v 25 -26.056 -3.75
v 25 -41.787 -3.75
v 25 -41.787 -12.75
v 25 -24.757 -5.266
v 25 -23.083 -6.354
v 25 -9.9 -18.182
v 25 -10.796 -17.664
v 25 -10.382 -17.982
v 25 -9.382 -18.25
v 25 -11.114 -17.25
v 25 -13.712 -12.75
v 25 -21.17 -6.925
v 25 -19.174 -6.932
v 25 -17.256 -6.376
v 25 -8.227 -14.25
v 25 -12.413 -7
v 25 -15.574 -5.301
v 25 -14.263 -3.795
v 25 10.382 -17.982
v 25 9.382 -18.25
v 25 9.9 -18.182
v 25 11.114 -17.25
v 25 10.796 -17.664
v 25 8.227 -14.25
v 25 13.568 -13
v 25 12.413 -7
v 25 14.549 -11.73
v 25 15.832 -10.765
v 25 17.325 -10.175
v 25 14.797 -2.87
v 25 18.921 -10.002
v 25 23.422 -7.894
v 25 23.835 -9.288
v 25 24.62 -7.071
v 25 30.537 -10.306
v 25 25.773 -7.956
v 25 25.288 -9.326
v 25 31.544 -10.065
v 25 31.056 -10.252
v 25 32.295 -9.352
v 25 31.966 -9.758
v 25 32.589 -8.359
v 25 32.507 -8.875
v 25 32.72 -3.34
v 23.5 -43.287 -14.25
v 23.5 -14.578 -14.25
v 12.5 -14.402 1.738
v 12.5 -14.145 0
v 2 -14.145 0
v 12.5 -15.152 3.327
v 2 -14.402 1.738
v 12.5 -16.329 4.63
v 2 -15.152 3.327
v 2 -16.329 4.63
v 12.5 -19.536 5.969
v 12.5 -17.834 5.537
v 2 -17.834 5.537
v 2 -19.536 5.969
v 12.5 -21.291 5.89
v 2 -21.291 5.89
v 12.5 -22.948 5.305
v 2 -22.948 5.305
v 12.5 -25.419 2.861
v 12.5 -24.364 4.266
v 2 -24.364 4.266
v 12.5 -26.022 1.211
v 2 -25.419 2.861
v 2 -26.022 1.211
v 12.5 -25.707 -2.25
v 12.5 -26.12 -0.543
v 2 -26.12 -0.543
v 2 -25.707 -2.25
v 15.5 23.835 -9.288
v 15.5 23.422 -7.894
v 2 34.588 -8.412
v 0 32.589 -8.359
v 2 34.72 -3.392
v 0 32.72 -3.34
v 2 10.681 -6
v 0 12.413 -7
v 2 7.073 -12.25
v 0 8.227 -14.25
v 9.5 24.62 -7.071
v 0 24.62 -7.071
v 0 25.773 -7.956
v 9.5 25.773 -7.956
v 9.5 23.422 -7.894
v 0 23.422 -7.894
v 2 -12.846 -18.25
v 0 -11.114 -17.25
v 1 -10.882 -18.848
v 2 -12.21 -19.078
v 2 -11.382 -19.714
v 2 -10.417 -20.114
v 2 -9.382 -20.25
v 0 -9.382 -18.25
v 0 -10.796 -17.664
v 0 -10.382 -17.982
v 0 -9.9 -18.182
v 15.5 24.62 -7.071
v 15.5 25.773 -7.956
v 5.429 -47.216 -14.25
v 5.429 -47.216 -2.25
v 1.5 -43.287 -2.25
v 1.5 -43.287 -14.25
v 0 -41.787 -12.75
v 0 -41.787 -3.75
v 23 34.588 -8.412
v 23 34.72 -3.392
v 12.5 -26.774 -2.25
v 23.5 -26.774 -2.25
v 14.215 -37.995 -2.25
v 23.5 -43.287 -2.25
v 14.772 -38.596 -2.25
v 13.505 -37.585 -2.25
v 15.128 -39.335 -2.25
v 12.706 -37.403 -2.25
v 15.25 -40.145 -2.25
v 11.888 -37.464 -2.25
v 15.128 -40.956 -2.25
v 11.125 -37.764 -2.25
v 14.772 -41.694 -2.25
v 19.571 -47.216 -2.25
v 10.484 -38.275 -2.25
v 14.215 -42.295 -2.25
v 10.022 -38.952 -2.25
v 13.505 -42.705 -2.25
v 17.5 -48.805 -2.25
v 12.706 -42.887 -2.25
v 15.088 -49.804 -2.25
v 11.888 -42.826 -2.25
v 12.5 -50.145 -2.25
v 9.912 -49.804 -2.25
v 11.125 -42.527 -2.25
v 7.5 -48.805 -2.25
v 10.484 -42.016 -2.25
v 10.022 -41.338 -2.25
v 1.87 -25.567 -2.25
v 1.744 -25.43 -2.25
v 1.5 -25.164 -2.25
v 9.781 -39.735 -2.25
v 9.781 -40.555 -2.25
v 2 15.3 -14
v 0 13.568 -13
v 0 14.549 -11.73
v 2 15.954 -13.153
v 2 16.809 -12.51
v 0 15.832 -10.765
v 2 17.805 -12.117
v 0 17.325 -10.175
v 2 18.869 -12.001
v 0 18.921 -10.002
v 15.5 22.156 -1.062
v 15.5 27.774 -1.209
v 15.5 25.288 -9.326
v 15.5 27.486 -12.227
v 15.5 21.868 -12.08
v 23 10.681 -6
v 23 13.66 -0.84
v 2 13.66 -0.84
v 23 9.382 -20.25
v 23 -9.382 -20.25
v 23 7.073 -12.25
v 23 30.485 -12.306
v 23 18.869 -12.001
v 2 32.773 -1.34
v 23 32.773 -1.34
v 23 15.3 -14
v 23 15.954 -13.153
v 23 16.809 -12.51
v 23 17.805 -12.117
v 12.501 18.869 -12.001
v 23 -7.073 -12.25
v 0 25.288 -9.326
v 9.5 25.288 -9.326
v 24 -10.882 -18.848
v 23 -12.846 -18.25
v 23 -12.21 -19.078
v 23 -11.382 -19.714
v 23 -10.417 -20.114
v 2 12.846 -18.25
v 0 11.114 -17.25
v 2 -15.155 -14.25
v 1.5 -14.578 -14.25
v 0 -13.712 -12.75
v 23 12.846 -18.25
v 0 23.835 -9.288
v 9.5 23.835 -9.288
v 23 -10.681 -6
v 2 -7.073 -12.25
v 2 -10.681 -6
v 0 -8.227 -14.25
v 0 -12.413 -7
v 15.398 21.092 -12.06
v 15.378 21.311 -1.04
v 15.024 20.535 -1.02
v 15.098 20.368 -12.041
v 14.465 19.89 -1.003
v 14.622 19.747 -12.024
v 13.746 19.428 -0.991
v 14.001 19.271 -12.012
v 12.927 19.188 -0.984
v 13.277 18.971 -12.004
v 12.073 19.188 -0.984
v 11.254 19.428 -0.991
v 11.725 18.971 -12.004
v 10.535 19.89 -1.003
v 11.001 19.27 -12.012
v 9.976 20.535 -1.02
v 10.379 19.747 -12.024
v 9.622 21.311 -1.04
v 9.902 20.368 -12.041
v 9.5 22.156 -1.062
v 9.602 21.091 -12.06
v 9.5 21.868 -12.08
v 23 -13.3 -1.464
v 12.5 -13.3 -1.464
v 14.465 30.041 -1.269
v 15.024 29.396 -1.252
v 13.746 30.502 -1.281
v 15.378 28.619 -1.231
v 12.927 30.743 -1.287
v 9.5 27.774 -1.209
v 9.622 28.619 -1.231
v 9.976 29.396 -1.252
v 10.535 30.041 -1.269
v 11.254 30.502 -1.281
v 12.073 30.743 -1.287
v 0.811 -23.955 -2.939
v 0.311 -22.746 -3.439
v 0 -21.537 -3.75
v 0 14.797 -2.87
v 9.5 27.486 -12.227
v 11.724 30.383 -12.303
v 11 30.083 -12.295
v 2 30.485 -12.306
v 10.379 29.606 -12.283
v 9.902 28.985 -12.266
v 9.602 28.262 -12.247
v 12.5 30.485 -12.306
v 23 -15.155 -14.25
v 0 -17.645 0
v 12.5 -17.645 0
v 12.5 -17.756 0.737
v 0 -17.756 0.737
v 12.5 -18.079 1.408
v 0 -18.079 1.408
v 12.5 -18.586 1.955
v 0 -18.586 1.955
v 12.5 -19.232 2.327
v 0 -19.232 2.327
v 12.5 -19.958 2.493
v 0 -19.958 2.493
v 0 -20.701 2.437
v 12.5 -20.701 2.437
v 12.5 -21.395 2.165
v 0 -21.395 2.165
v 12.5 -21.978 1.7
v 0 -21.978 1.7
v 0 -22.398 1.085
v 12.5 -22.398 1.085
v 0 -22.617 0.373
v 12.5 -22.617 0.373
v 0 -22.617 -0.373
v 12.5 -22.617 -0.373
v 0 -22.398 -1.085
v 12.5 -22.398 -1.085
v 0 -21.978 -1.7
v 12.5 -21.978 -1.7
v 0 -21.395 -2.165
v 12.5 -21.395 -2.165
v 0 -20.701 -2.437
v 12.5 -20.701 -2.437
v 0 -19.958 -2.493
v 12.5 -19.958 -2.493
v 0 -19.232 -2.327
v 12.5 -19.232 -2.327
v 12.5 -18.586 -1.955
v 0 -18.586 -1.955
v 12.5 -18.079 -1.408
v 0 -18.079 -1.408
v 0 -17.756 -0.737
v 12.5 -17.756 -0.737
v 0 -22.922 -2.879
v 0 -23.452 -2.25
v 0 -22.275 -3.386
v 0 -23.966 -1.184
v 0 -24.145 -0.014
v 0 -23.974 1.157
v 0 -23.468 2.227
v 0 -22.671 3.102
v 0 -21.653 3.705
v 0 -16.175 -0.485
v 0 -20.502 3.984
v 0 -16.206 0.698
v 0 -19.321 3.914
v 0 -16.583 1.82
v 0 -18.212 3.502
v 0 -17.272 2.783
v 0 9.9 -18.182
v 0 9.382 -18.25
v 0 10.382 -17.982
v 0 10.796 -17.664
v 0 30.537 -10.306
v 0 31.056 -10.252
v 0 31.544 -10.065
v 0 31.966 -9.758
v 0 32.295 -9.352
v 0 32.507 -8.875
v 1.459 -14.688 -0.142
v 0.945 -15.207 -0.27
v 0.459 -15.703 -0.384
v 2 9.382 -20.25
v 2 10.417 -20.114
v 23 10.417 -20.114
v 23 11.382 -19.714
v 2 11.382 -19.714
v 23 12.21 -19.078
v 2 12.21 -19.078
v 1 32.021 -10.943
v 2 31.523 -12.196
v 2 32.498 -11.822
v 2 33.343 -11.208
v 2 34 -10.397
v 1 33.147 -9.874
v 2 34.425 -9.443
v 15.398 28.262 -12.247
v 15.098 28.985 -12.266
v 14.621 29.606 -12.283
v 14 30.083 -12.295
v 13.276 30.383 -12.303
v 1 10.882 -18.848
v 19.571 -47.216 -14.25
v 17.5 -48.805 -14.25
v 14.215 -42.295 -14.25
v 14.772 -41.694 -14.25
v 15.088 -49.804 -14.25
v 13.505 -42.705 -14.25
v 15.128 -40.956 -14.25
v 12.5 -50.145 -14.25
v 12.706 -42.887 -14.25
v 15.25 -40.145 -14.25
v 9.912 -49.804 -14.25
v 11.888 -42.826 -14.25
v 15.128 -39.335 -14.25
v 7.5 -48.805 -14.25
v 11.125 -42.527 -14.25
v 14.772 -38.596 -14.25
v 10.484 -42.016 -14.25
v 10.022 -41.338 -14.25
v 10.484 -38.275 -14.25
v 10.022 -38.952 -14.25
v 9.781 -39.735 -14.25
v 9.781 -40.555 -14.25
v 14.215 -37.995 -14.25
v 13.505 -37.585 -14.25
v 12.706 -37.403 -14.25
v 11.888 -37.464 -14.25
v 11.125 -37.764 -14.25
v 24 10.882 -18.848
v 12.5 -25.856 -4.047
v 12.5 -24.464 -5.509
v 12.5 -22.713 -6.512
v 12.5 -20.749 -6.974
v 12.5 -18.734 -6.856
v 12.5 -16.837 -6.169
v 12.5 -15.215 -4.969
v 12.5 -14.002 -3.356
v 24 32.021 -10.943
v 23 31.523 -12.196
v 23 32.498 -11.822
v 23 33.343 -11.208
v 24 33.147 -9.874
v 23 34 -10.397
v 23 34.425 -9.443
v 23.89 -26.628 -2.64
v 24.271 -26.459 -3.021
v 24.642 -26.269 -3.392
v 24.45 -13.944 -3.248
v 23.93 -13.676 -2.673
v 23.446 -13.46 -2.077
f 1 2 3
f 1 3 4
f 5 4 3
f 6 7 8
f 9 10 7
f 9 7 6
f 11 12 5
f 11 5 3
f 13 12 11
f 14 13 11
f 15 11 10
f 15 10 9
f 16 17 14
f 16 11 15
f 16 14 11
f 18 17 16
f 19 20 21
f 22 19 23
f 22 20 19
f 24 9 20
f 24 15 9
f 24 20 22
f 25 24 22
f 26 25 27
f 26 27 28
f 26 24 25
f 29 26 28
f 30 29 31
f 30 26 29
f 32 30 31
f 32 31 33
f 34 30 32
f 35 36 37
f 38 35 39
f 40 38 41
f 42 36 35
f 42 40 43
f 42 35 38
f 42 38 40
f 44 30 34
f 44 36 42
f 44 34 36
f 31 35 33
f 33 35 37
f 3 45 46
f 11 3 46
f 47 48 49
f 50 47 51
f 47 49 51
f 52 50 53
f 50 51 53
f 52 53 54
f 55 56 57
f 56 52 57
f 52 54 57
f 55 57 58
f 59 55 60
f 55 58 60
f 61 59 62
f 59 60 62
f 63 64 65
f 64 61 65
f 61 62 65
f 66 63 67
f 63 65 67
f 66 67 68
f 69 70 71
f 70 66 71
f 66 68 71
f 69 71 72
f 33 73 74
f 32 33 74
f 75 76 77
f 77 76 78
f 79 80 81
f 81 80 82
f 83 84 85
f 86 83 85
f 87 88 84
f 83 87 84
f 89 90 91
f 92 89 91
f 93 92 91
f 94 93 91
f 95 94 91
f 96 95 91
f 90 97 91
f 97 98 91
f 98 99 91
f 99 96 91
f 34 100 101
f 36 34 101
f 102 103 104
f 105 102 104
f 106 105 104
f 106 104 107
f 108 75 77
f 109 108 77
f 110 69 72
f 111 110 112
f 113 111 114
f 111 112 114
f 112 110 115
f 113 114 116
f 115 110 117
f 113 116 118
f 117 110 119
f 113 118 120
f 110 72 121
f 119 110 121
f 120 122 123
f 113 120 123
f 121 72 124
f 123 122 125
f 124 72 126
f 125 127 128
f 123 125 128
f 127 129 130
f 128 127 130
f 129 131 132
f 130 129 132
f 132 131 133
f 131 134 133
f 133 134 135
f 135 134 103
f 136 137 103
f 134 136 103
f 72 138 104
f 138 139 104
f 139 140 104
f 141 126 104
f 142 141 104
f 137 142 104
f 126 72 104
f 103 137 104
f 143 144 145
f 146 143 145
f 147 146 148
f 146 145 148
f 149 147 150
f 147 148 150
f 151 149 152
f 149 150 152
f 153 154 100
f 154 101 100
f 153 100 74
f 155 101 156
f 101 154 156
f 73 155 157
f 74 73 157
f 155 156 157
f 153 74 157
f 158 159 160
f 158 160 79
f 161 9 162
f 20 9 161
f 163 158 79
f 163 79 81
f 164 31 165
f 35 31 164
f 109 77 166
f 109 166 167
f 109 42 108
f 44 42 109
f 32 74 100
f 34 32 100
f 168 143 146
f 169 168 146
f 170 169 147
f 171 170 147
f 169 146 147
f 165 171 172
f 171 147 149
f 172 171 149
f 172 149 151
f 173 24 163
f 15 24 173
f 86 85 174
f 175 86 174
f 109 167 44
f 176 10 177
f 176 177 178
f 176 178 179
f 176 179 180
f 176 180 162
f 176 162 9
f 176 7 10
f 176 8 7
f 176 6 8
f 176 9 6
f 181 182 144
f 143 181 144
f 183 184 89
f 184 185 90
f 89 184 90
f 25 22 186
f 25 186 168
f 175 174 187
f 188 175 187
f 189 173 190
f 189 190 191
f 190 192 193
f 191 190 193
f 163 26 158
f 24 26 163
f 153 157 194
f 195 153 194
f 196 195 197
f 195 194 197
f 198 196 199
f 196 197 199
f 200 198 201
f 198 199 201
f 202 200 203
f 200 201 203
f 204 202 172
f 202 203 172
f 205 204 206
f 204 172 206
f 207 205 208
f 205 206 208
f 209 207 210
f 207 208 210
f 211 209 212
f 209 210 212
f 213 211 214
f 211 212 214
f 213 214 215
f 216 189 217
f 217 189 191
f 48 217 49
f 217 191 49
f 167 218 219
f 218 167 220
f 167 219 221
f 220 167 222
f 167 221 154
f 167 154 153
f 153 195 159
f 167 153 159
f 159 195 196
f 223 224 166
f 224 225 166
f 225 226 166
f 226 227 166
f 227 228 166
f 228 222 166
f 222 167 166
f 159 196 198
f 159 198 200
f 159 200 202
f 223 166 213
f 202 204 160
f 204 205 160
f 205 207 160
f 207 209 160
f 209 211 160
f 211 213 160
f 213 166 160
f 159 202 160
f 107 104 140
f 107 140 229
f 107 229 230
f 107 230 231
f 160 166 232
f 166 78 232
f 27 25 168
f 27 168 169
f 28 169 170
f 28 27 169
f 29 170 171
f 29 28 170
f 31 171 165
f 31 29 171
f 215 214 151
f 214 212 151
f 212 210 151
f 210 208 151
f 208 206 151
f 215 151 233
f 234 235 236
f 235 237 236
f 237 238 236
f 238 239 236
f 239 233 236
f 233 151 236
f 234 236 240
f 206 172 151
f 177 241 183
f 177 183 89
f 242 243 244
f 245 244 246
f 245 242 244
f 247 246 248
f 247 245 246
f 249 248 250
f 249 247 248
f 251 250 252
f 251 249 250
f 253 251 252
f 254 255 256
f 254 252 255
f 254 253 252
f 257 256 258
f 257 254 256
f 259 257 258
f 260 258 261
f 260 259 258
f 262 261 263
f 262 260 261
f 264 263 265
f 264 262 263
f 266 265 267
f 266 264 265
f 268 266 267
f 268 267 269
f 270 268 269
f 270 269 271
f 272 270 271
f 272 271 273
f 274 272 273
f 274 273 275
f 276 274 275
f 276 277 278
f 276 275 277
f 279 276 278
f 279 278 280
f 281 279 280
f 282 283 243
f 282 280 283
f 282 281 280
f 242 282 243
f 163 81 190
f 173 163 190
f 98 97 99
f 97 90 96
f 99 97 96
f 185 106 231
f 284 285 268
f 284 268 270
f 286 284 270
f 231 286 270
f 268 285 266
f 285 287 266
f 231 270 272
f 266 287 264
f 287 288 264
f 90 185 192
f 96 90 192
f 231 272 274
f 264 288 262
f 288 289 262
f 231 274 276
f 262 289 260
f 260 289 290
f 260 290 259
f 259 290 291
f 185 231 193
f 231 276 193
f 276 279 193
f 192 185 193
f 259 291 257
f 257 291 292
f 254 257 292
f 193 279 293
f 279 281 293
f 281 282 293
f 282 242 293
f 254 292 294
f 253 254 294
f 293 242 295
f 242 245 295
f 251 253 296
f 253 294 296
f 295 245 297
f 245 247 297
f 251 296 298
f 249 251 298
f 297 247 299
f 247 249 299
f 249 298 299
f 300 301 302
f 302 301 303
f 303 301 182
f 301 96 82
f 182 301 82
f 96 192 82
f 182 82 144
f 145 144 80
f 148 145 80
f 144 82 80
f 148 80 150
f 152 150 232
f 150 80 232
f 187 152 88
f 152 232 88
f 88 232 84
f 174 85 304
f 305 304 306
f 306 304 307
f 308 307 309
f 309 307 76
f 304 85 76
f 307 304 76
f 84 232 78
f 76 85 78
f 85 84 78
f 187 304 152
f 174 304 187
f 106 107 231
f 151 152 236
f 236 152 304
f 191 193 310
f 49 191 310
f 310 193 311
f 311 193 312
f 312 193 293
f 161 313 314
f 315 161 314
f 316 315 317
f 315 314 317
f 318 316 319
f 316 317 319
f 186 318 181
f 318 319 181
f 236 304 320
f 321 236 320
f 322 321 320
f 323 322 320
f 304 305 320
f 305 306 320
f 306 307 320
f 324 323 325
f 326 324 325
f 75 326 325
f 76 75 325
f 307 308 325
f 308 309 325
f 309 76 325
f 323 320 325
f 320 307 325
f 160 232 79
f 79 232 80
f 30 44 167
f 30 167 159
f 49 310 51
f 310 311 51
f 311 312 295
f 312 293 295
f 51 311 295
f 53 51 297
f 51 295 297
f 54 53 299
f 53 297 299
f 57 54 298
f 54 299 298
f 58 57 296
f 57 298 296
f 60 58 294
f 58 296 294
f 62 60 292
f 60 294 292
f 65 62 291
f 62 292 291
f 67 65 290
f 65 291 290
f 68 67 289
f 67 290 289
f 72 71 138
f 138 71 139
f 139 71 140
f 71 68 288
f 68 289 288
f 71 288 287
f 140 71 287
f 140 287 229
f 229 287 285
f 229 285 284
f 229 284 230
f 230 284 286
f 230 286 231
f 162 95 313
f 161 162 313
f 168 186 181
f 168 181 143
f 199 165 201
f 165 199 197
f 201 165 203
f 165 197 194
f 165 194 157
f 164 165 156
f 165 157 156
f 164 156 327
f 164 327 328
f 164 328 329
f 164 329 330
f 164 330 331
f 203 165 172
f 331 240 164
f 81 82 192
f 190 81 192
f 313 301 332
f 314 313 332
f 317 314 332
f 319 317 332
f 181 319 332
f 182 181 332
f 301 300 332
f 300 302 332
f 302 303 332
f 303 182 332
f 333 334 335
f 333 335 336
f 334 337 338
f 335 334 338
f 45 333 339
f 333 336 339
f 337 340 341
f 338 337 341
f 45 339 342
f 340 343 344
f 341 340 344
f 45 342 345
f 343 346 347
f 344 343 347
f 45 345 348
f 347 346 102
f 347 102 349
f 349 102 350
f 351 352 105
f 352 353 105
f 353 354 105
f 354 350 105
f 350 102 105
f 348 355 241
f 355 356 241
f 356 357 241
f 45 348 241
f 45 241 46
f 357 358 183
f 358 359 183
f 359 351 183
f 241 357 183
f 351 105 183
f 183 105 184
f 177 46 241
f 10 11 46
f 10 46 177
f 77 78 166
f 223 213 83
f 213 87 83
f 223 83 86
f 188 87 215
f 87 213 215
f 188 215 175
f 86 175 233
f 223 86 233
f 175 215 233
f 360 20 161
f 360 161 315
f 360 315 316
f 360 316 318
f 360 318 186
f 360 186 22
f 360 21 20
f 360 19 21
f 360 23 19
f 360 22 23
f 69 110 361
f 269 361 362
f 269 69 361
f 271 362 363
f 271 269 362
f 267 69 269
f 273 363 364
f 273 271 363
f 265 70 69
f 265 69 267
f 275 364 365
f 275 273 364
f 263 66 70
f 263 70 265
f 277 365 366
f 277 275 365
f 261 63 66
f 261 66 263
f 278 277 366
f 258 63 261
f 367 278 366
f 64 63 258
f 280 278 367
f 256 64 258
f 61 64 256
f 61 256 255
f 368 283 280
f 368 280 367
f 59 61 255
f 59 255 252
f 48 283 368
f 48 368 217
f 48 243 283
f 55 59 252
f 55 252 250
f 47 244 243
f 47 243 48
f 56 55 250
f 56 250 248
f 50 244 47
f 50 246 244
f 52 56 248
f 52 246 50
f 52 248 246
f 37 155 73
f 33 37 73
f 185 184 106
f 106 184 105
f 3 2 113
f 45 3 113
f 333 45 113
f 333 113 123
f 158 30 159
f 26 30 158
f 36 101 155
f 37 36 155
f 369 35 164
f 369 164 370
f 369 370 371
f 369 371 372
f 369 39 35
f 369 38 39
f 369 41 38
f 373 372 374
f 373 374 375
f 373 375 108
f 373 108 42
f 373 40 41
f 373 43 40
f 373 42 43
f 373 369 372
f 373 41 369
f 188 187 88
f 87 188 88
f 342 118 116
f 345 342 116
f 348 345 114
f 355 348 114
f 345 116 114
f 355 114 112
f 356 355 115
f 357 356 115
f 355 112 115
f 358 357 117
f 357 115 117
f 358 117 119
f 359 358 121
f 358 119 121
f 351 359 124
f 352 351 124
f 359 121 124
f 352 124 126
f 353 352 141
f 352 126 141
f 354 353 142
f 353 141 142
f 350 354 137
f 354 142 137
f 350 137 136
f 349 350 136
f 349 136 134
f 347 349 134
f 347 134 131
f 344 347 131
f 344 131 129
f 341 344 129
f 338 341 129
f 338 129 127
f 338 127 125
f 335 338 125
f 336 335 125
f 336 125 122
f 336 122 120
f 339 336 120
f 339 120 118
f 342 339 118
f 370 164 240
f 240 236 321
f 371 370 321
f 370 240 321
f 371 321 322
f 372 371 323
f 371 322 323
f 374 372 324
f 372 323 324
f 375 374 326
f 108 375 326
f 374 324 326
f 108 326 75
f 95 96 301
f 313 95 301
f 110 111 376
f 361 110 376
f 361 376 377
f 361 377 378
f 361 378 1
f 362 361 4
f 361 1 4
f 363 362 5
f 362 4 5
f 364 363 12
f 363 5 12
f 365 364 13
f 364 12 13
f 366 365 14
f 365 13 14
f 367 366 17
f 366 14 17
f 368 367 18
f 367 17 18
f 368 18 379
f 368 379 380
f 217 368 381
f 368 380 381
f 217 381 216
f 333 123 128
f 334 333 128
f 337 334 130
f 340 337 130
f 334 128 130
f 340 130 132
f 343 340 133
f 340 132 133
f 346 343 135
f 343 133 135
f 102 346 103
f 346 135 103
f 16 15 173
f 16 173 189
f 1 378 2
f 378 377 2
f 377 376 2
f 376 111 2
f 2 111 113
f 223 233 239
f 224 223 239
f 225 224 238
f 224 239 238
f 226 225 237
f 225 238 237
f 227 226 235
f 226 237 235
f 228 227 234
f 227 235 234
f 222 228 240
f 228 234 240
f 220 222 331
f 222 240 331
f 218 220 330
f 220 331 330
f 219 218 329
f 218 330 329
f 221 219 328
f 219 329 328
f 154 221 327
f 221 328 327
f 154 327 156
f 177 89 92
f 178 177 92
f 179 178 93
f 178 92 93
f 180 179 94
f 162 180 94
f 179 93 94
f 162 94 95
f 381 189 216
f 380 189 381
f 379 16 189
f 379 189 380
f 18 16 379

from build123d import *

# Parameters (mm, degrees)
F0_R     = 2.5
F1_DEPTH = 25
F2_R     = 7
F3_DEPTH = 12.5
F5_DEPTH = 25
F6_R     = 2.75
F7_DEPTH = 25
F8_SIZE  = 2
F9_SIZE  = 1.5


with BuildPart() as f1:
    # F0 (on Right) → F1 (new body)
    with BuildSketch(Plane.YZ):
        with BuildLine():
            Line((34.771998, -1.392547), (13.660271, -0.839717))
            Line((13.660271, -0.839717), (10.68098, -6))
            Line((10.68098, -6), (7.072541, -12.25))
            Line((7.072541, -12.25), (-7.072541, -12.25))
            Line((-7.072541, -12.25), (-10.68098, -6))
            Line((-10.68098, -6), (-14.145082, 0))
            ThreePointArc((-14.145082, 0), (-18.998978, -5.88952), (-25.70723, -2.25))
            Line((-25.70723, -2.25), (-50.145082, -2.25))
            Line((-50.145082, -2.25), (-50.145082, -14.25))
            Line((-50.145082, -14.25), (-15.155445, -14.25))
            Line((-15.155445, -14.25), (-12.846043, -18.25))
            ThreePointArc((-12.846043, -18.25), (-11.381942, -19.714102), (-9.381942, -20.25))
            Line((-9.381942, -20.25), (9.381942, -20.25))
            ThreePointArc((9.381942, -20.25), (11.381942, -19.714102), (12.846043, -18.25))
            Line((12.846043, -18.25), (15.299782, -14))
            ThreePointArc((15.299782, -14), (16.809399, -12.510016), (18.868592, -12.001371))
            Line((18.868592, -12.001371), (30.48486, -12.305553))
            ThreePointArc((30.48486, -12.305553), (33.342986, -11.208422), (34.588197, -8.411632))
            Line((34.588197, -8.411632), (34.771998, -1.392547))
        make_face()
        Polygon((25.287627, -9.3256), (23.83504, -9.287563), (23.422342, -7.894316), (24.619867, -7.07128), (25.772677, -7.955862), align=None, mode=Mode.SUBTRACT)
        with BuildLine():
            ThreePointArc((-25.70723, -2.25), (-18.998978, -5.88952), (-14.145082, 0))
            ThreePointArc((-14.145082, 0), (-21.291185, 5.88952), (-25.70723, -2.25))
        make_face()
        with Locations((-20.145082, 0)):
            Circle(F0_R, mode=Mode.SUBTRACT)
    extrude(amount=F1_DEPTH)

    # F2 (on face) → F3 (cut)
    with BuildSketch(Plane.YZ.offset(25)):
        with Locations((-20.145082, 0)):
            Circle(F2_R)
    extrude(amount=-F3_DEPTH, mode=Mode.SUBTRACT)

    # F4 (on face) → F5 (cut)
    with BuildSketch(Plane(origin=(0, -0.301122, -11.499394), x_dir=(1, 0, 0), z_dir=(0, -0.026177, -0.999657))):
        with BuildLine():
            Line((9.5, -22.176285), (9.5, -27.796535))
            ThreePointArc((9.5, -27.796535), (12.5, -30.796535), (15.5, -27.796535))
            Line((15.5, -27.796535), (15.5, -22.176285))
            ThreePointArc((15.5, -22.176285), (12.5, -19.176285), (9.5, -22.176285))
        make_face()
    extrude(amount=-F5_DEPTH, mode=Mode.SUBTRACT)

    # F6 (on face) → F7 (cut)
    with BuildSketch(Plane.XY.offset(-2.25)):
        with Locations((12.5, -40.145082)):
            Circle(F6_R)
        with BuildLine():
            ThreePointArc((19.571068, -47.216149), (12.5, -50.145082), (5.428932, -47.216149))
            Line((5.428932, -47.216149), (-9.84301, -31.944207))
            Line((-9.84301, -31.944207), (-9.84301, -58.411797))
            Line((-9.84301, -58.411797), (34.84301, -58.411797))
            Line((34.84301, -58.411797), (34.84301, -31.944207))
            Line((34.84301, -31.944207), (19.571068, -47.216149))
        make_face()
    extrude(amount=-F7_DEPTH, mode=Mode.SUBTRACT)

    # F8
    f8_edges = [f1.edges().sort_by_distance(p)[0] for p in [
        (0, 24.216134, -1.116132),
        (0, 10.366406, -6.544858),
        (0, 0, -12.25),
        (0, -10.608811, -6.125),
        (0, -21.291185, 5.88952),
        (0, -14.000744, -16.25),
        (12.5, 34.771998, -1.392547),
        (25, 24.216134, -1.116132),
        (25, 10.366406, -6.544858),
        (25, 0, -12.25),
        (25, -10.186207, -6.856971),
        (25, -14.000744, -16.25),
        (25, -11.381942, -19.714102),
        (25, 0, -20.25),
        (25, 11.381942, -19.714102),
        (25, 14.072913, -16.125),
        (25, 24.676726, -12.153462),
        (25, 16.809399, -12.510016),
        (25, 33.342986, -11.208422),
        (25, 34.680097, -4.902089),
        (0, -11.381942, -19.714102),
        (0, 0, -20.25),
        (0, 11.381942, -19.714102),
        (0, 14.072913, -16.125),
        (0, 16.809399, -12.510016),
        (0, 24.676726, -12.153462),
        (0, 33.342986, -11.208422),
        (0, 34.680097, -4.902089),
    ]]
    chamfer(f8_edges, length=F8_SIZE)

    # F9
    f9_edges = [f1.edges().sort_by_distance(p)[0] for p in [
        (25, -28.471331, -14.25),
        (25, -34.280418, -2.25),
        (0, -33.747224, -2.25),
        (0, -28.471331, -14.25),
    ]]
    chamfer(f9_edges, length=F9_SIZE)


solid = f1.part
